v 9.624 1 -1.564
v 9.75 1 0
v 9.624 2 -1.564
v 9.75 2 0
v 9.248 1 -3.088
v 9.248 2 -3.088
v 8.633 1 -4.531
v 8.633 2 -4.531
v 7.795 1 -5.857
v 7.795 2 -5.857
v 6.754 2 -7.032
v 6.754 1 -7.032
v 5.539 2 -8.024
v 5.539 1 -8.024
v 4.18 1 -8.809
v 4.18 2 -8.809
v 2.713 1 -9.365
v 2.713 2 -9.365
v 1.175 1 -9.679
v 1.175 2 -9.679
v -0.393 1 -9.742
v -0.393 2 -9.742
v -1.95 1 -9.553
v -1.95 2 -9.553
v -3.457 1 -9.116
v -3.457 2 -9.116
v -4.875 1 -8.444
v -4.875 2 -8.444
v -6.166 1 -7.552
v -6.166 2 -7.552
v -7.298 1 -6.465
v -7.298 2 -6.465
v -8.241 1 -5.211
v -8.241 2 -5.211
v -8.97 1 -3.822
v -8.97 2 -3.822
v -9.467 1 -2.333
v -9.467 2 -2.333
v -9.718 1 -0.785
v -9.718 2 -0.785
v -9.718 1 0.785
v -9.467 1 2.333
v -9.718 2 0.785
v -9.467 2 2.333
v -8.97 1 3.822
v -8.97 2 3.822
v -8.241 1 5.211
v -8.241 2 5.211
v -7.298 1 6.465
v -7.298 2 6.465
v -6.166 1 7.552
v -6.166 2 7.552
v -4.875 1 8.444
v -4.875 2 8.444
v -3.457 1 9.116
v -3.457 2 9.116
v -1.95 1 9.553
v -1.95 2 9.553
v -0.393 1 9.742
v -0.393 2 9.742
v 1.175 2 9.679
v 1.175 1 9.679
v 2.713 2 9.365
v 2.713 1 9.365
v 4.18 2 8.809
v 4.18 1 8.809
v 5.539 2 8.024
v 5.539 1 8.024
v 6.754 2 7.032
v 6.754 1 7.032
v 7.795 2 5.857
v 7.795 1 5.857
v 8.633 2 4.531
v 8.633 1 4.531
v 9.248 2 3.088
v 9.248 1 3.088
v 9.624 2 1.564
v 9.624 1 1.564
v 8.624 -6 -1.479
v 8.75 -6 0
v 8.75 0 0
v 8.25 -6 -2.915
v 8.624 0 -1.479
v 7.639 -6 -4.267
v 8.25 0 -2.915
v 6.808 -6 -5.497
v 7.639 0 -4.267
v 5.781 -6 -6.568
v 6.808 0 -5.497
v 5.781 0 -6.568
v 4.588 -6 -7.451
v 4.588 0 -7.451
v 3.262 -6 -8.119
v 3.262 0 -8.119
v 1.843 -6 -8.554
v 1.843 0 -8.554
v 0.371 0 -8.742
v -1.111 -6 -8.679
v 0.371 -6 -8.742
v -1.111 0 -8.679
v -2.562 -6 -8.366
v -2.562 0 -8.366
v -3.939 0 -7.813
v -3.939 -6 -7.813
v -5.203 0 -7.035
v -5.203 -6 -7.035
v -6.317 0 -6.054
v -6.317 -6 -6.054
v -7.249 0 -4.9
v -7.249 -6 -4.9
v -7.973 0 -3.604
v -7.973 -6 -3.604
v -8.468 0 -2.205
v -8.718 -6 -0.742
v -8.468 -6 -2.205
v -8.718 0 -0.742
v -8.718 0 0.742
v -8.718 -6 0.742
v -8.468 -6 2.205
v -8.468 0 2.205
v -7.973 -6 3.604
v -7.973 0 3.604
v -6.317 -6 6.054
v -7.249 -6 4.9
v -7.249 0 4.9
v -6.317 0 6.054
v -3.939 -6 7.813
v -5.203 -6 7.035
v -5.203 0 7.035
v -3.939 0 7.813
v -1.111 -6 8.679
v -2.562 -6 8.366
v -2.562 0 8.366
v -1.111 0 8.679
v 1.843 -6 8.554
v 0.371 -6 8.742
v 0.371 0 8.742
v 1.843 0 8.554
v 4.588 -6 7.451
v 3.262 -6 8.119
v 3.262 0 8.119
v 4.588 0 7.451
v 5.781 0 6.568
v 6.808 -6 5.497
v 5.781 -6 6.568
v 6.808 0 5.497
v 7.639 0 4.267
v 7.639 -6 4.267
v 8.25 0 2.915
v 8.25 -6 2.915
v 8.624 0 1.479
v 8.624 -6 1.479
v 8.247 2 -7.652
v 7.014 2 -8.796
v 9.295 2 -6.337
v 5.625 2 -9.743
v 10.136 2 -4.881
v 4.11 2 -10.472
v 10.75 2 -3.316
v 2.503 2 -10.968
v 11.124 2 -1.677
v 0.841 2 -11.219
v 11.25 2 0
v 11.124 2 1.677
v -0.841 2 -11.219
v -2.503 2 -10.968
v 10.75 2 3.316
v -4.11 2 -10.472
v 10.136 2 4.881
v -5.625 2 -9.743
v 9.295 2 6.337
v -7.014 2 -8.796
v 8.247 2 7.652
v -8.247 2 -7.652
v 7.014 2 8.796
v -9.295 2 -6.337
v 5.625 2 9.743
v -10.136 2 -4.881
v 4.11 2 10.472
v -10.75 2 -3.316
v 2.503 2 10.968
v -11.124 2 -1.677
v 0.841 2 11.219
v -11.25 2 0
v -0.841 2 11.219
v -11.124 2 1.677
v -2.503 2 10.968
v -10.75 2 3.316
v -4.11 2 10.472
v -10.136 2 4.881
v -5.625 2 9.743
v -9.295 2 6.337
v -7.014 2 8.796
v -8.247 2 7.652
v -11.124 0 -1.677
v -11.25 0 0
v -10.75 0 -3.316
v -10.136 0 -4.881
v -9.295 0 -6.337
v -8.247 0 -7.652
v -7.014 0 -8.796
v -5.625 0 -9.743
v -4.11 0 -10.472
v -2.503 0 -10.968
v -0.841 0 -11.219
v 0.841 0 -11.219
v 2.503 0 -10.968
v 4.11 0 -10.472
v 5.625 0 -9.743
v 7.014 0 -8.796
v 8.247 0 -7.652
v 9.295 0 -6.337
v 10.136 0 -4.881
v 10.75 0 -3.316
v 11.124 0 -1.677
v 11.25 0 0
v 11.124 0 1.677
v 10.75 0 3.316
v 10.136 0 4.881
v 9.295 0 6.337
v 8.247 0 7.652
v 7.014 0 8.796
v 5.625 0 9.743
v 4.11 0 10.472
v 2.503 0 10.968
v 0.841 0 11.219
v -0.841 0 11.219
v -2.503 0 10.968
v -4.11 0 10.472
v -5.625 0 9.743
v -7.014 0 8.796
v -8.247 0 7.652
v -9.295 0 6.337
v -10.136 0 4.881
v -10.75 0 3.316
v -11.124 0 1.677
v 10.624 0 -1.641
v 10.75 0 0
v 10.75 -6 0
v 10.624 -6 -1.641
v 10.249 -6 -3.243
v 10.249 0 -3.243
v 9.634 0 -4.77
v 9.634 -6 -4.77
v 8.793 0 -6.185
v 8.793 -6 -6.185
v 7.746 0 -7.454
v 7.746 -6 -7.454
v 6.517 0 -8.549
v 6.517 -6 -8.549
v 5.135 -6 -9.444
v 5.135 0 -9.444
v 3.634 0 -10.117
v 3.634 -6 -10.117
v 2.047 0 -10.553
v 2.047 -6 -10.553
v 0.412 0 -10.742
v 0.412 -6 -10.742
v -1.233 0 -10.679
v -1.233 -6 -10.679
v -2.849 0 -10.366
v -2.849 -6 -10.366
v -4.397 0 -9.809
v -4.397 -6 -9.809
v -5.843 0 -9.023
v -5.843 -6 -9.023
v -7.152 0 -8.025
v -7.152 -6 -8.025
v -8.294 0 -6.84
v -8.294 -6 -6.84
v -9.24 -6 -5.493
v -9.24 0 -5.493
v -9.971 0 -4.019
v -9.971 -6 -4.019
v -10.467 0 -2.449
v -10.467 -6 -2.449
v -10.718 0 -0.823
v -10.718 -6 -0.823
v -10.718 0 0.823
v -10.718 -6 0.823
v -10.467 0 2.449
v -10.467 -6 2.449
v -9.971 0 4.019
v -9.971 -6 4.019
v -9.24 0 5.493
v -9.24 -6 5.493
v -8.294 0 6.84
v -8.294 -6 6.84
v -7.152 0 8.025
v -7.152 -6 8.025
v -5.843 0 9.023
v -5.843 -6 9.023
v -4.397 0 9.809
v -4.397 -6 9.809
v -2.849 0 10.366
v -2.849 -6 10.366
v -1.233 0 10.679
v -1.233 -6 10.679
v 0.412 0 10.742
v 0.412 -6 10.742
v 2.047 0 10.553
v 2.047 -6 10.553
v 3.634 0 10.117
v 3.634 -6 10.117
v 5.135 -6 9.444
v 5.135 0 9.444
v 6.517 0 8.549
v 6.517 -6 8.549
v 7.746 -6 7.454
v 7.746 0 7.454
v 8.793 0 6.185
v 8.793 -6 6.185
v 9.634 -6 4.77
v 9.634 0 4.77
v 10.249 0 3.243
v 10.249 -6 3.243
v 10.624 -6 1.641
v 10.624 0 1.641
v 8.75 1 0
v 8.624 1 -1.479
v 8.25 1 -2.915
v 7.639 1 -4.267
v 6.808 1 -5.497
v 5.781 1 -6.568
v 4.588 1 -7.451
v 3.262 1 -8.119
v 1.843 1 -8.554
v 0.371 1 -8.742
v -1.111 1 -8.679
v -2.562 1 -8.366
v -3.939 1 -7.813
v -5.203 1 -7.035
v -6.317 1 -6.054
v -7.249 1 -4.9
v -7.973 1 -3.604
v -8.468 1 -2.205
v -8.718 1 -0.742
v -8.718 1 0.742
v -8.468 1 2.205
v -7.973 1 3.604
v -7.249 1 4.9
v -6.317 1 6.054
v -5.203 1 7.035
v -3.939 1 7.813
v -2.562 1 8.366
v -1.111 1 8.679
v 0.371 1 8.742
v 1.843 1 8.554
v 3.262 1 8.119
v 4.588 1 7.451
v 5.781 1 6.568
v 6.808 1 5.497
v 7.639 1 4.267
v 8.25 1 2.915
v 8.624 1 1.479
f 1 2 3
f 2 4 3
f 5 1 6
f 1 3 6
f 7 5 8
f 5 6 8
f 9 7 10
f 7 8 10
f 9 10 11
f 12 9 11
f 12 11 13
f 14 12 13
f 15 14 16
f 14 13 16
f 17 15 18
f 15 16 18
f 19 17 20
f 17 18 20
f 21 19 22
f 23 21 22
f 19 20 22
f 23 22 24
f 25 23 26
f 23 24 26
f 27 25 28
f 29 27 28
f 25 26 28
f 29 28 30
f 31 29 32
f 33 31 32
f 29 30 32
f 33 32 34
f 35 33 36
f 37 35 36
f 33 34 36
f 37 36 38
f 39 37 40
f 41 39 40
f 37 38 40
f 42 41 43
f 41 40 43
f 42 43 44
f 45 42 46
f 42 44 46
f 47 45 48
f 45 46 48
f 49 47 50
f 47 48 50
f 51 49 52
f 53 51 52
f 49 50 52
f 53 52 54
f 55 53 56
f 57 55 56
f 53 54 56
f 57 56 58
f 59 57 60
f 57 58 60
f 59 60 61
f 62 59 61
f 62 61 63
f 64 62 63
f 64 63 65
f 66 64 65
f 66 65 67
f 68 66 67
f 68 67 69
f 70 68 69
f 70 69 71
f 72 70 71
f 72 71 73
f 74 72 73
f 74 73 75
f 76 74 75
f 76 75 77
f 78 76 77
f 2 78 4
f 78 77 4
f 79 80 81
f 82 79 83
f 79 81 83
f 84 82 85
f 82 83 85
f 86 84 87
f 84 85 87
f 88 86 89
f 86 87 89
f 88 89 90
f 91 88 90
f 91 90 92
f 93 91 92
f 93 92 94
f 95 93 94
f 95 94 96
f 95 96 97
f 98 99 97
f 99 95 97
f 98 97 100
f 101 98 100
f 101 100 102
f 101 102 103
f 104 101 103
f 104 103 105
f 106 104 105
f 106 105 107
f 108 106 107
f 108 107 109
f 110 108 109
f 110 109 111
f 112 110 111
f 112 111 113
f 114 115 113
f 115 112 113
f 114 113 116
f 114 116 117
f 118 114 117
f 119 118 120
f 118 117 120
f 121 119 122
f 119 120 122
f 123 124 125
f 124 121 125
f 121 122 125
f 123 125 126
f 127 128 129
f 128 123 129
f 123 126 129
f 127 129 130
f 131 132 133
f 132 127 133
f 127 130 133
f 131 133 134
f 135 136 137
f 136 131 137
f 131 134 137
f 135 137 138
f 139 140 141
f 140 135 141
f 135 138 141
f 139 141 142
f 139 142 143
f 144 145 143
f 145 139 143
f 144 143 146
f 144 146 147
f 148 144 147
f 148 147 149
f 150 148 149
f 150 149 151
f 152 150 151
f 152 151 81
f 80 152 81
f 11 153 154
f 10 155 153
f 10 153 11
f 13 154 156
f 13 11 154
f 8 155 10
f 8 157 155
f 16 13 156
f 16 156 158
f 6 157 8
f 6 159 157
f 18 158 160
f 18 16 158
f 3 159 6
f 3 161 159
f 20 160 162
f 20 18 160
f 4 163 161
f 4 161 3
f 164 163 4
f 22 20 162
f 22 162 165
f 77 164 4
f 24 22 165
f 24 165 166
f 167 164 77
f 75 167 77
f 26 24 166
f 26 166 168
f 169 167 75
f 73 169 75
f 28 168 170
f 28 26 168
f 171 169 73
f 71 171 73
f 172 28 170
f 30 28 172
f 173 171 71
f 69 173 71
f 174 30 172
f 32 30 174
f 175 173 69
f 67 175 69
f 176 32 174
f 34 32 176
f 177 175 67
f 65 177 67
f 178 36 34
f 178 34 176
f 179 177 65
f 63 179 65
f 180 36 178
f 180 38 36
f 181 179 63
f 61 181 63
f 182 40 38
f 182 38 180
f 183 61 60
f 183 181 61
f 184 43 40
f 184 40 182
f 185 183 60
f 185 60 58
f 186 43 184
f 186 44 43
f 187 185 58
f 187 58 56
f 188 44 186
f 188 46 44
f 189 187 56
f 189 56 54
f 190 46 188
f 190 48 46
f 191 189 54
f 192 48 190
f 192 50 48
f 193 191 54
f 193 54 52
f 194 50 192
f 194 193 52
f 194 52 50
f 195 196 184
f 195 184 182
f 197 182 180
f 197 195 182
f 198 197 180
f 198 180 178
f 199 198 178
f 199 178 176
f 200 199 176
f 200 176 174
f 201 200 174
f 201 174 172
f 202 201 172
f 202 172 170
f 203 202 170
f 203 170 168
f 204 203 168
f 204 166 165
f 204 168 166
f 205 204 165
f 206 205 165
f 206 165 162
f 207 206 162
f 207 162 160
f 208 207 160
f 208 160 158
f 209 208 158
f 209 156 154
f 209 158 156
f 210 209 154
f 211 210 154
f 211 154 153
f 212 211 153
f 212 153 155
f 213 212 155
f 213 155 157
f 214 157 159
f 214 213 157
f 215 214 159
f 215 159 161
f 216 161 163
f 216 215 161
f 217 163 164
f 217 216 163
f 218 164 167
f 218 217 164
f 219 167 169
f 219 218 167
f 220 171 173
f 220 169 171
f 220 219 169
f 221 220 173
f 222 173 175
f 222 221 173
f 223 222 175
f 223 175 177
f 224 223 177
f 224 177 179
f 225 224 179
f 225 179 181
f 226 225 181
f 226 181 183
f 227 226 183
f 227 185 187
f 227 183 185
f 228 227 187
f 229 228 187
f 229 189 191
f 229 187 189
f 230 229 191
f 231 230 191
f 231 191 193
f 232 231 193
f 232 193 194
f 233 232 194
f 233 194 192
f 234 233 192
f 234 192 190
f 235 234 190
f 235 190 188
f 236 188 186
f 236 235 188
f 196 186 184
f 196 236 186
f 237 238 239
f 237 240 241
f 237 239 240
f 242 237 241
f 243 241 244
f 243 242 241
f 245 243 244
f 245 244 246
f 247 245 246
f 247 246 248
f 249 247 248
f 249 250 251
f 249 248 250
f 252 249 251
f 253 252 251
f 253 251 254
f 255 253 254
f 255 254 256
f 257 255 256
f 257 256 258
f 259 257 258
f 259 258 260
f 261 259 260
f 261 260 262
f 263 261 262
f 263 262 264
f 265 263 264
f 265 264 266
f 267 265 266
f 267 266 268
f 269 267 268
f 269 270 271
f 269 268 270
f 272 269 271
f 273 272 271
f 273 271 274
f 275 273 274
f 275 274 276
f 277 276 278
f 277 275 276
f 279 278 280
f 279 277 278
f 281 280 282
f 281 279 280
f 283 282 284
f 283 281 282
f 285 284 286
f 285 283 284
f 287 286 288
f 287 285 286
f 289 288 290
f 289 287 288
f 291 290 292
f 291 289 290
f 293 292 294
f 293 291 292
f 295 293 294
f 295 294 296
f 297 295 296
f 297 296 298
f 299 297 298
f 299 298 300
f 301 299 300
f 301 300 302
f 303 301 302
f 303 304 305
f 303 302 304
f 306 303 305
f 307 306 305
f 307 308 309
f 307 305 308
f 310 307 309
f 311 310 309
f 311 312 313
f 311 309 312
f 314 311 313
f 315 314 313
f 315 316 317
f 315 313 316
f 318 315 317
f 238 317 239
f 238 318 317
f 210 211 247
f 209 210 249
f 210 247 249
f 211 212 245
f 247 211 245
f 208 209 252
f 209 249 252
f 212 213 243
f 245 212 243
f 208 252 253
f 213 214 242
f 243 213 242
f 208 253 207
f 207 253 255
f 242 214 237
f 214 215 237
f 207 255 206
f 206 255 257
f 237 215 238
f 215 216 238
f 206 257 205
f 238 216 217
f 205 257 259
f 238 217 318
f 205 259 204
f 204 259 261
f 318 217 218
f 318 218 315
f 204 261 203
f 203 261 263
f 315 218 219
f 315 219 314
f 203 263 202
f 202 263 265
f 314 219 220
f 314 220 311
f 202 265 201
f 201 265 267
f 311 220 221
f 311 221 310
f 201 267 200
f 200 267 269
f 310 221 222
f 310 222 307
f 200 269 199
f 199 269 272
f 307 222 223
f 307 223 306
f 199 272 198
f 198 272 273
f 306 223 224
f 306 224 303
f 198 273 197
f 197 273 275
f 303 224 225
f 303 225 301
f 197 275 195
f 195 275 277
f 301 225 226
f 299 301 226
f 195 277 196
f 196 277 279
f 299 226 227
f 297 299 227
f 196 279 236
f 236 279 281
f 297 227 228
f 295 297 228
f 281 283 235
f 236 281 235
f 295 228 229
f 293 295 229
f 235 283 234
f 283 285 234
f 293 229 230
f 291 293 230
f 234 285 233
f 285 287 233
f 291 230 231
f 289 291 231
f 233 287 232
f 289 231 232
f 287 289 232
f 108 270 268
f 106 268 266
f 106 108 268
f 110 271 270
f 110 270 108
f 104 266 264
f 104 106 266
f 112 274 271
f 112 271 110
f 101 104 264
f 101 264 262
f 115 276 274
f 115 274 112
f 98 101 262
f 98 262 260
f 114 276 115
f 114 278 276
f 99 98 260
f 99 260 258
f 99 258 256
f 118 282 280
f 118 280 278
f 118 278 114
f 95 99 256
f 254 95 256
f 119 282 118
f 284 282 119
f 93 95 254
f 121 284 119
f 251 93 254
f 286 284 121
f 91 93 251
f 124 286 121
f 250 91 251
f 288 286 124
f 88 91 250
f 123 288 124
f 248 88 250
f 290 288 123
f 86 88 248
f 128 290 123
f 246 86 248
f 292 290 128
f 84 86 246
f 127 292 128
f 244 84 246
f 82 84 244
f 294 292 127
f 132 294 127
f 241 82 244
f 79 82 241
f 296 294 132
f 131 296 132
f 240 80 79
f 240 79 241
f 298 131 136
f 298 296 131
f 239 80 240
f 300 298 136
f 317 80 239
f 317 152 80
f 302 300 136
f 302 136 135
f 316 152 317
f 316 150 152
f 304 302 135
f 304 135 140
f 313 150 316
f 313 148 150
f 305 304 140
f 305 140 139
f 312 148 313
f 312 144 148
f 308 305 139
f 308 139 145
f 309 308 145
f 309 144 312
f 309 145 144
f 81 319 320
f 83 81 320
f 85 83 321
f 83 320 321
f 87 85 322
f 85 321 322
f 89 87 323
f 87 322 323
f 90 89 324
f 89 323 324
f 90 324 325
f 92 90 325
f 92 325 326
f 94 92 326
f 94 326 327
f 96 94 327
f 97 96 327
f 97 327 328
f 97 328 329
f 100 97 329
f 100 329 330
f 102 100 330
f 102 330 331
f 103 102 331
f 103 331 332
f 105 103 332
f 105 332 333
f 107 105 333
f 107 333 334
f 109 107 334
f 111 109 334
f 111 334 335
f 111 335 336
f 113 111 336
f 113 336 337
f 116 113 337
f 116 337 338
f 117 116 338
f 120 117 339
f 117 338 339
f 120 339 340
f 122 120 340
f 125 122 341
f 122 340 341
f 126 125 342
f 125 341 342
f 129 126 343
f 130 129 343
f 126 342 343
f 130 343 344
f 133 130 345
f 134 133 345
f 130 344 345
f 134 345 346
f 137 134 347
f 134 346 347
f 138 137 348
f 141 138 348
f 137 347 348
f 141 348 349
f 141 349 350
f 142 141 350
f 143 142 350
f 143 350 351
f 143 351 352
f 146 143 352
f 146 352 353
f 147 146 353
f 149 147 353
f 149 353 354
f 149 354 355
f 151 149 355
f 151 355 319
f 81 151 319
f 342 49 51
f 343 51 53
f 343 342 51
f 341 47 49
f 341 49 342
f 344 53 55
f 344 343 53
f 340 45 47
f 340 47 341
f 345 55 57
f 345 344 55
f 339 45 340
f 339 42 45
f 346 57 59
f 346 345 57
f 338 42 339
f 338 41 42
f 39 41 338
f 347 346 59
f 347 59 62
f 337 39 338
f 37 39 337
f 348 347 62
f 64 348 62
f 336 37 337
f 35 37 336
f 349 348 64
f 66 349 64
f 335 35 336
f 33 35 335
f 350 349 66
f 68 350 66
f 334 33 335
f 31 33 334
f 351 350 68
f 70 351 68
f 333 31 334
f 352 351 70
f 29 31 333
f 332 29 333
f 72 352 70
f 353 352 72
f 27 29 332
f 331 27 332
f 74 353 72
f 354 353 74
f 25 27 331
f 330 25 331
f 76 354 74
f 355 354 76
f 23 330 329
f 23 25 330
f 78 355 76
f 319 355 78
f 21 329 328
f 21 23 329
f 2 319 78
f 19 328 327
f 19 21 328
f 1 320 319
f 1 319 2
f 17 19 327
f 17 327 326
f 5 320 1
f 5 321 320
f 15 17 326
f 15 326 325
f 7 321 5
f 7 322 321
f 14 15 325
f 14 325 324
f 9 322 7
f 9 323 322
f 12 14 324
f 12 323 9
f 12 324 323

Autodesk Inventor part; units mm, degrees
ref_plane "YZ Plane" through (0, 0, 0) normal (1, 0, 0) x (0, 1, 0)
ref_plane "XZ Plane" through (0, 0, 0) normal (0, 1, 0) x (-1, 0, 0)
ref_plane "XY Plane" through (0, 0, 0) normal (0, 0, 1) x (1, 0, 0)
sketch "Sketch1" plane through (0, 0, 0) normal (0, 1, 0) x (-1, 0, 0)
  circle A0 centre (0, 0) radius 9.75
  circle A1 centre (0, 0) radius 11.25
  dimension "d0" = 19.5
  dimension "d1" = 22.5
extrude "Extrusion1" add sketch "Sketch1" along normal blind 2 contours A0 | A1
sketch "Sketch2" plane through (0, 2, 0) normal (0, 1, 0) x (1, 0, 0)
  circle A0 centre (0, 0) radius 9.75
  dimension "d4" = 19.5
extrude "Extrusion2" cut sketch "Sketch2" against normal blind 1
sketch "Sketch3" plane through (0, 1, 0) normal (0, 1, 0) x (1, 0, 0)
  circle A0 centre (0, 0) radius 8.75
  dimension "d7" = 17.5
extrude "Extrusion3" cut sketch "Sketch3" against normal blind 1
sketch "Sketch4" plane through (0, 0, 0) normal (0, -1, 0) x (1, 0, 0)
  circle A0 centre (0, 0) radius 8.75
  circle A1 centre (0, 0) radius 10.75
  dimension "d10" = 21.5
  dimension "d13" = 17.5
extrude "Extrusion4" add sketch "Sketch4" along normal blind 6
properties part number "685ZZFlanged_Adapter_3mm"
